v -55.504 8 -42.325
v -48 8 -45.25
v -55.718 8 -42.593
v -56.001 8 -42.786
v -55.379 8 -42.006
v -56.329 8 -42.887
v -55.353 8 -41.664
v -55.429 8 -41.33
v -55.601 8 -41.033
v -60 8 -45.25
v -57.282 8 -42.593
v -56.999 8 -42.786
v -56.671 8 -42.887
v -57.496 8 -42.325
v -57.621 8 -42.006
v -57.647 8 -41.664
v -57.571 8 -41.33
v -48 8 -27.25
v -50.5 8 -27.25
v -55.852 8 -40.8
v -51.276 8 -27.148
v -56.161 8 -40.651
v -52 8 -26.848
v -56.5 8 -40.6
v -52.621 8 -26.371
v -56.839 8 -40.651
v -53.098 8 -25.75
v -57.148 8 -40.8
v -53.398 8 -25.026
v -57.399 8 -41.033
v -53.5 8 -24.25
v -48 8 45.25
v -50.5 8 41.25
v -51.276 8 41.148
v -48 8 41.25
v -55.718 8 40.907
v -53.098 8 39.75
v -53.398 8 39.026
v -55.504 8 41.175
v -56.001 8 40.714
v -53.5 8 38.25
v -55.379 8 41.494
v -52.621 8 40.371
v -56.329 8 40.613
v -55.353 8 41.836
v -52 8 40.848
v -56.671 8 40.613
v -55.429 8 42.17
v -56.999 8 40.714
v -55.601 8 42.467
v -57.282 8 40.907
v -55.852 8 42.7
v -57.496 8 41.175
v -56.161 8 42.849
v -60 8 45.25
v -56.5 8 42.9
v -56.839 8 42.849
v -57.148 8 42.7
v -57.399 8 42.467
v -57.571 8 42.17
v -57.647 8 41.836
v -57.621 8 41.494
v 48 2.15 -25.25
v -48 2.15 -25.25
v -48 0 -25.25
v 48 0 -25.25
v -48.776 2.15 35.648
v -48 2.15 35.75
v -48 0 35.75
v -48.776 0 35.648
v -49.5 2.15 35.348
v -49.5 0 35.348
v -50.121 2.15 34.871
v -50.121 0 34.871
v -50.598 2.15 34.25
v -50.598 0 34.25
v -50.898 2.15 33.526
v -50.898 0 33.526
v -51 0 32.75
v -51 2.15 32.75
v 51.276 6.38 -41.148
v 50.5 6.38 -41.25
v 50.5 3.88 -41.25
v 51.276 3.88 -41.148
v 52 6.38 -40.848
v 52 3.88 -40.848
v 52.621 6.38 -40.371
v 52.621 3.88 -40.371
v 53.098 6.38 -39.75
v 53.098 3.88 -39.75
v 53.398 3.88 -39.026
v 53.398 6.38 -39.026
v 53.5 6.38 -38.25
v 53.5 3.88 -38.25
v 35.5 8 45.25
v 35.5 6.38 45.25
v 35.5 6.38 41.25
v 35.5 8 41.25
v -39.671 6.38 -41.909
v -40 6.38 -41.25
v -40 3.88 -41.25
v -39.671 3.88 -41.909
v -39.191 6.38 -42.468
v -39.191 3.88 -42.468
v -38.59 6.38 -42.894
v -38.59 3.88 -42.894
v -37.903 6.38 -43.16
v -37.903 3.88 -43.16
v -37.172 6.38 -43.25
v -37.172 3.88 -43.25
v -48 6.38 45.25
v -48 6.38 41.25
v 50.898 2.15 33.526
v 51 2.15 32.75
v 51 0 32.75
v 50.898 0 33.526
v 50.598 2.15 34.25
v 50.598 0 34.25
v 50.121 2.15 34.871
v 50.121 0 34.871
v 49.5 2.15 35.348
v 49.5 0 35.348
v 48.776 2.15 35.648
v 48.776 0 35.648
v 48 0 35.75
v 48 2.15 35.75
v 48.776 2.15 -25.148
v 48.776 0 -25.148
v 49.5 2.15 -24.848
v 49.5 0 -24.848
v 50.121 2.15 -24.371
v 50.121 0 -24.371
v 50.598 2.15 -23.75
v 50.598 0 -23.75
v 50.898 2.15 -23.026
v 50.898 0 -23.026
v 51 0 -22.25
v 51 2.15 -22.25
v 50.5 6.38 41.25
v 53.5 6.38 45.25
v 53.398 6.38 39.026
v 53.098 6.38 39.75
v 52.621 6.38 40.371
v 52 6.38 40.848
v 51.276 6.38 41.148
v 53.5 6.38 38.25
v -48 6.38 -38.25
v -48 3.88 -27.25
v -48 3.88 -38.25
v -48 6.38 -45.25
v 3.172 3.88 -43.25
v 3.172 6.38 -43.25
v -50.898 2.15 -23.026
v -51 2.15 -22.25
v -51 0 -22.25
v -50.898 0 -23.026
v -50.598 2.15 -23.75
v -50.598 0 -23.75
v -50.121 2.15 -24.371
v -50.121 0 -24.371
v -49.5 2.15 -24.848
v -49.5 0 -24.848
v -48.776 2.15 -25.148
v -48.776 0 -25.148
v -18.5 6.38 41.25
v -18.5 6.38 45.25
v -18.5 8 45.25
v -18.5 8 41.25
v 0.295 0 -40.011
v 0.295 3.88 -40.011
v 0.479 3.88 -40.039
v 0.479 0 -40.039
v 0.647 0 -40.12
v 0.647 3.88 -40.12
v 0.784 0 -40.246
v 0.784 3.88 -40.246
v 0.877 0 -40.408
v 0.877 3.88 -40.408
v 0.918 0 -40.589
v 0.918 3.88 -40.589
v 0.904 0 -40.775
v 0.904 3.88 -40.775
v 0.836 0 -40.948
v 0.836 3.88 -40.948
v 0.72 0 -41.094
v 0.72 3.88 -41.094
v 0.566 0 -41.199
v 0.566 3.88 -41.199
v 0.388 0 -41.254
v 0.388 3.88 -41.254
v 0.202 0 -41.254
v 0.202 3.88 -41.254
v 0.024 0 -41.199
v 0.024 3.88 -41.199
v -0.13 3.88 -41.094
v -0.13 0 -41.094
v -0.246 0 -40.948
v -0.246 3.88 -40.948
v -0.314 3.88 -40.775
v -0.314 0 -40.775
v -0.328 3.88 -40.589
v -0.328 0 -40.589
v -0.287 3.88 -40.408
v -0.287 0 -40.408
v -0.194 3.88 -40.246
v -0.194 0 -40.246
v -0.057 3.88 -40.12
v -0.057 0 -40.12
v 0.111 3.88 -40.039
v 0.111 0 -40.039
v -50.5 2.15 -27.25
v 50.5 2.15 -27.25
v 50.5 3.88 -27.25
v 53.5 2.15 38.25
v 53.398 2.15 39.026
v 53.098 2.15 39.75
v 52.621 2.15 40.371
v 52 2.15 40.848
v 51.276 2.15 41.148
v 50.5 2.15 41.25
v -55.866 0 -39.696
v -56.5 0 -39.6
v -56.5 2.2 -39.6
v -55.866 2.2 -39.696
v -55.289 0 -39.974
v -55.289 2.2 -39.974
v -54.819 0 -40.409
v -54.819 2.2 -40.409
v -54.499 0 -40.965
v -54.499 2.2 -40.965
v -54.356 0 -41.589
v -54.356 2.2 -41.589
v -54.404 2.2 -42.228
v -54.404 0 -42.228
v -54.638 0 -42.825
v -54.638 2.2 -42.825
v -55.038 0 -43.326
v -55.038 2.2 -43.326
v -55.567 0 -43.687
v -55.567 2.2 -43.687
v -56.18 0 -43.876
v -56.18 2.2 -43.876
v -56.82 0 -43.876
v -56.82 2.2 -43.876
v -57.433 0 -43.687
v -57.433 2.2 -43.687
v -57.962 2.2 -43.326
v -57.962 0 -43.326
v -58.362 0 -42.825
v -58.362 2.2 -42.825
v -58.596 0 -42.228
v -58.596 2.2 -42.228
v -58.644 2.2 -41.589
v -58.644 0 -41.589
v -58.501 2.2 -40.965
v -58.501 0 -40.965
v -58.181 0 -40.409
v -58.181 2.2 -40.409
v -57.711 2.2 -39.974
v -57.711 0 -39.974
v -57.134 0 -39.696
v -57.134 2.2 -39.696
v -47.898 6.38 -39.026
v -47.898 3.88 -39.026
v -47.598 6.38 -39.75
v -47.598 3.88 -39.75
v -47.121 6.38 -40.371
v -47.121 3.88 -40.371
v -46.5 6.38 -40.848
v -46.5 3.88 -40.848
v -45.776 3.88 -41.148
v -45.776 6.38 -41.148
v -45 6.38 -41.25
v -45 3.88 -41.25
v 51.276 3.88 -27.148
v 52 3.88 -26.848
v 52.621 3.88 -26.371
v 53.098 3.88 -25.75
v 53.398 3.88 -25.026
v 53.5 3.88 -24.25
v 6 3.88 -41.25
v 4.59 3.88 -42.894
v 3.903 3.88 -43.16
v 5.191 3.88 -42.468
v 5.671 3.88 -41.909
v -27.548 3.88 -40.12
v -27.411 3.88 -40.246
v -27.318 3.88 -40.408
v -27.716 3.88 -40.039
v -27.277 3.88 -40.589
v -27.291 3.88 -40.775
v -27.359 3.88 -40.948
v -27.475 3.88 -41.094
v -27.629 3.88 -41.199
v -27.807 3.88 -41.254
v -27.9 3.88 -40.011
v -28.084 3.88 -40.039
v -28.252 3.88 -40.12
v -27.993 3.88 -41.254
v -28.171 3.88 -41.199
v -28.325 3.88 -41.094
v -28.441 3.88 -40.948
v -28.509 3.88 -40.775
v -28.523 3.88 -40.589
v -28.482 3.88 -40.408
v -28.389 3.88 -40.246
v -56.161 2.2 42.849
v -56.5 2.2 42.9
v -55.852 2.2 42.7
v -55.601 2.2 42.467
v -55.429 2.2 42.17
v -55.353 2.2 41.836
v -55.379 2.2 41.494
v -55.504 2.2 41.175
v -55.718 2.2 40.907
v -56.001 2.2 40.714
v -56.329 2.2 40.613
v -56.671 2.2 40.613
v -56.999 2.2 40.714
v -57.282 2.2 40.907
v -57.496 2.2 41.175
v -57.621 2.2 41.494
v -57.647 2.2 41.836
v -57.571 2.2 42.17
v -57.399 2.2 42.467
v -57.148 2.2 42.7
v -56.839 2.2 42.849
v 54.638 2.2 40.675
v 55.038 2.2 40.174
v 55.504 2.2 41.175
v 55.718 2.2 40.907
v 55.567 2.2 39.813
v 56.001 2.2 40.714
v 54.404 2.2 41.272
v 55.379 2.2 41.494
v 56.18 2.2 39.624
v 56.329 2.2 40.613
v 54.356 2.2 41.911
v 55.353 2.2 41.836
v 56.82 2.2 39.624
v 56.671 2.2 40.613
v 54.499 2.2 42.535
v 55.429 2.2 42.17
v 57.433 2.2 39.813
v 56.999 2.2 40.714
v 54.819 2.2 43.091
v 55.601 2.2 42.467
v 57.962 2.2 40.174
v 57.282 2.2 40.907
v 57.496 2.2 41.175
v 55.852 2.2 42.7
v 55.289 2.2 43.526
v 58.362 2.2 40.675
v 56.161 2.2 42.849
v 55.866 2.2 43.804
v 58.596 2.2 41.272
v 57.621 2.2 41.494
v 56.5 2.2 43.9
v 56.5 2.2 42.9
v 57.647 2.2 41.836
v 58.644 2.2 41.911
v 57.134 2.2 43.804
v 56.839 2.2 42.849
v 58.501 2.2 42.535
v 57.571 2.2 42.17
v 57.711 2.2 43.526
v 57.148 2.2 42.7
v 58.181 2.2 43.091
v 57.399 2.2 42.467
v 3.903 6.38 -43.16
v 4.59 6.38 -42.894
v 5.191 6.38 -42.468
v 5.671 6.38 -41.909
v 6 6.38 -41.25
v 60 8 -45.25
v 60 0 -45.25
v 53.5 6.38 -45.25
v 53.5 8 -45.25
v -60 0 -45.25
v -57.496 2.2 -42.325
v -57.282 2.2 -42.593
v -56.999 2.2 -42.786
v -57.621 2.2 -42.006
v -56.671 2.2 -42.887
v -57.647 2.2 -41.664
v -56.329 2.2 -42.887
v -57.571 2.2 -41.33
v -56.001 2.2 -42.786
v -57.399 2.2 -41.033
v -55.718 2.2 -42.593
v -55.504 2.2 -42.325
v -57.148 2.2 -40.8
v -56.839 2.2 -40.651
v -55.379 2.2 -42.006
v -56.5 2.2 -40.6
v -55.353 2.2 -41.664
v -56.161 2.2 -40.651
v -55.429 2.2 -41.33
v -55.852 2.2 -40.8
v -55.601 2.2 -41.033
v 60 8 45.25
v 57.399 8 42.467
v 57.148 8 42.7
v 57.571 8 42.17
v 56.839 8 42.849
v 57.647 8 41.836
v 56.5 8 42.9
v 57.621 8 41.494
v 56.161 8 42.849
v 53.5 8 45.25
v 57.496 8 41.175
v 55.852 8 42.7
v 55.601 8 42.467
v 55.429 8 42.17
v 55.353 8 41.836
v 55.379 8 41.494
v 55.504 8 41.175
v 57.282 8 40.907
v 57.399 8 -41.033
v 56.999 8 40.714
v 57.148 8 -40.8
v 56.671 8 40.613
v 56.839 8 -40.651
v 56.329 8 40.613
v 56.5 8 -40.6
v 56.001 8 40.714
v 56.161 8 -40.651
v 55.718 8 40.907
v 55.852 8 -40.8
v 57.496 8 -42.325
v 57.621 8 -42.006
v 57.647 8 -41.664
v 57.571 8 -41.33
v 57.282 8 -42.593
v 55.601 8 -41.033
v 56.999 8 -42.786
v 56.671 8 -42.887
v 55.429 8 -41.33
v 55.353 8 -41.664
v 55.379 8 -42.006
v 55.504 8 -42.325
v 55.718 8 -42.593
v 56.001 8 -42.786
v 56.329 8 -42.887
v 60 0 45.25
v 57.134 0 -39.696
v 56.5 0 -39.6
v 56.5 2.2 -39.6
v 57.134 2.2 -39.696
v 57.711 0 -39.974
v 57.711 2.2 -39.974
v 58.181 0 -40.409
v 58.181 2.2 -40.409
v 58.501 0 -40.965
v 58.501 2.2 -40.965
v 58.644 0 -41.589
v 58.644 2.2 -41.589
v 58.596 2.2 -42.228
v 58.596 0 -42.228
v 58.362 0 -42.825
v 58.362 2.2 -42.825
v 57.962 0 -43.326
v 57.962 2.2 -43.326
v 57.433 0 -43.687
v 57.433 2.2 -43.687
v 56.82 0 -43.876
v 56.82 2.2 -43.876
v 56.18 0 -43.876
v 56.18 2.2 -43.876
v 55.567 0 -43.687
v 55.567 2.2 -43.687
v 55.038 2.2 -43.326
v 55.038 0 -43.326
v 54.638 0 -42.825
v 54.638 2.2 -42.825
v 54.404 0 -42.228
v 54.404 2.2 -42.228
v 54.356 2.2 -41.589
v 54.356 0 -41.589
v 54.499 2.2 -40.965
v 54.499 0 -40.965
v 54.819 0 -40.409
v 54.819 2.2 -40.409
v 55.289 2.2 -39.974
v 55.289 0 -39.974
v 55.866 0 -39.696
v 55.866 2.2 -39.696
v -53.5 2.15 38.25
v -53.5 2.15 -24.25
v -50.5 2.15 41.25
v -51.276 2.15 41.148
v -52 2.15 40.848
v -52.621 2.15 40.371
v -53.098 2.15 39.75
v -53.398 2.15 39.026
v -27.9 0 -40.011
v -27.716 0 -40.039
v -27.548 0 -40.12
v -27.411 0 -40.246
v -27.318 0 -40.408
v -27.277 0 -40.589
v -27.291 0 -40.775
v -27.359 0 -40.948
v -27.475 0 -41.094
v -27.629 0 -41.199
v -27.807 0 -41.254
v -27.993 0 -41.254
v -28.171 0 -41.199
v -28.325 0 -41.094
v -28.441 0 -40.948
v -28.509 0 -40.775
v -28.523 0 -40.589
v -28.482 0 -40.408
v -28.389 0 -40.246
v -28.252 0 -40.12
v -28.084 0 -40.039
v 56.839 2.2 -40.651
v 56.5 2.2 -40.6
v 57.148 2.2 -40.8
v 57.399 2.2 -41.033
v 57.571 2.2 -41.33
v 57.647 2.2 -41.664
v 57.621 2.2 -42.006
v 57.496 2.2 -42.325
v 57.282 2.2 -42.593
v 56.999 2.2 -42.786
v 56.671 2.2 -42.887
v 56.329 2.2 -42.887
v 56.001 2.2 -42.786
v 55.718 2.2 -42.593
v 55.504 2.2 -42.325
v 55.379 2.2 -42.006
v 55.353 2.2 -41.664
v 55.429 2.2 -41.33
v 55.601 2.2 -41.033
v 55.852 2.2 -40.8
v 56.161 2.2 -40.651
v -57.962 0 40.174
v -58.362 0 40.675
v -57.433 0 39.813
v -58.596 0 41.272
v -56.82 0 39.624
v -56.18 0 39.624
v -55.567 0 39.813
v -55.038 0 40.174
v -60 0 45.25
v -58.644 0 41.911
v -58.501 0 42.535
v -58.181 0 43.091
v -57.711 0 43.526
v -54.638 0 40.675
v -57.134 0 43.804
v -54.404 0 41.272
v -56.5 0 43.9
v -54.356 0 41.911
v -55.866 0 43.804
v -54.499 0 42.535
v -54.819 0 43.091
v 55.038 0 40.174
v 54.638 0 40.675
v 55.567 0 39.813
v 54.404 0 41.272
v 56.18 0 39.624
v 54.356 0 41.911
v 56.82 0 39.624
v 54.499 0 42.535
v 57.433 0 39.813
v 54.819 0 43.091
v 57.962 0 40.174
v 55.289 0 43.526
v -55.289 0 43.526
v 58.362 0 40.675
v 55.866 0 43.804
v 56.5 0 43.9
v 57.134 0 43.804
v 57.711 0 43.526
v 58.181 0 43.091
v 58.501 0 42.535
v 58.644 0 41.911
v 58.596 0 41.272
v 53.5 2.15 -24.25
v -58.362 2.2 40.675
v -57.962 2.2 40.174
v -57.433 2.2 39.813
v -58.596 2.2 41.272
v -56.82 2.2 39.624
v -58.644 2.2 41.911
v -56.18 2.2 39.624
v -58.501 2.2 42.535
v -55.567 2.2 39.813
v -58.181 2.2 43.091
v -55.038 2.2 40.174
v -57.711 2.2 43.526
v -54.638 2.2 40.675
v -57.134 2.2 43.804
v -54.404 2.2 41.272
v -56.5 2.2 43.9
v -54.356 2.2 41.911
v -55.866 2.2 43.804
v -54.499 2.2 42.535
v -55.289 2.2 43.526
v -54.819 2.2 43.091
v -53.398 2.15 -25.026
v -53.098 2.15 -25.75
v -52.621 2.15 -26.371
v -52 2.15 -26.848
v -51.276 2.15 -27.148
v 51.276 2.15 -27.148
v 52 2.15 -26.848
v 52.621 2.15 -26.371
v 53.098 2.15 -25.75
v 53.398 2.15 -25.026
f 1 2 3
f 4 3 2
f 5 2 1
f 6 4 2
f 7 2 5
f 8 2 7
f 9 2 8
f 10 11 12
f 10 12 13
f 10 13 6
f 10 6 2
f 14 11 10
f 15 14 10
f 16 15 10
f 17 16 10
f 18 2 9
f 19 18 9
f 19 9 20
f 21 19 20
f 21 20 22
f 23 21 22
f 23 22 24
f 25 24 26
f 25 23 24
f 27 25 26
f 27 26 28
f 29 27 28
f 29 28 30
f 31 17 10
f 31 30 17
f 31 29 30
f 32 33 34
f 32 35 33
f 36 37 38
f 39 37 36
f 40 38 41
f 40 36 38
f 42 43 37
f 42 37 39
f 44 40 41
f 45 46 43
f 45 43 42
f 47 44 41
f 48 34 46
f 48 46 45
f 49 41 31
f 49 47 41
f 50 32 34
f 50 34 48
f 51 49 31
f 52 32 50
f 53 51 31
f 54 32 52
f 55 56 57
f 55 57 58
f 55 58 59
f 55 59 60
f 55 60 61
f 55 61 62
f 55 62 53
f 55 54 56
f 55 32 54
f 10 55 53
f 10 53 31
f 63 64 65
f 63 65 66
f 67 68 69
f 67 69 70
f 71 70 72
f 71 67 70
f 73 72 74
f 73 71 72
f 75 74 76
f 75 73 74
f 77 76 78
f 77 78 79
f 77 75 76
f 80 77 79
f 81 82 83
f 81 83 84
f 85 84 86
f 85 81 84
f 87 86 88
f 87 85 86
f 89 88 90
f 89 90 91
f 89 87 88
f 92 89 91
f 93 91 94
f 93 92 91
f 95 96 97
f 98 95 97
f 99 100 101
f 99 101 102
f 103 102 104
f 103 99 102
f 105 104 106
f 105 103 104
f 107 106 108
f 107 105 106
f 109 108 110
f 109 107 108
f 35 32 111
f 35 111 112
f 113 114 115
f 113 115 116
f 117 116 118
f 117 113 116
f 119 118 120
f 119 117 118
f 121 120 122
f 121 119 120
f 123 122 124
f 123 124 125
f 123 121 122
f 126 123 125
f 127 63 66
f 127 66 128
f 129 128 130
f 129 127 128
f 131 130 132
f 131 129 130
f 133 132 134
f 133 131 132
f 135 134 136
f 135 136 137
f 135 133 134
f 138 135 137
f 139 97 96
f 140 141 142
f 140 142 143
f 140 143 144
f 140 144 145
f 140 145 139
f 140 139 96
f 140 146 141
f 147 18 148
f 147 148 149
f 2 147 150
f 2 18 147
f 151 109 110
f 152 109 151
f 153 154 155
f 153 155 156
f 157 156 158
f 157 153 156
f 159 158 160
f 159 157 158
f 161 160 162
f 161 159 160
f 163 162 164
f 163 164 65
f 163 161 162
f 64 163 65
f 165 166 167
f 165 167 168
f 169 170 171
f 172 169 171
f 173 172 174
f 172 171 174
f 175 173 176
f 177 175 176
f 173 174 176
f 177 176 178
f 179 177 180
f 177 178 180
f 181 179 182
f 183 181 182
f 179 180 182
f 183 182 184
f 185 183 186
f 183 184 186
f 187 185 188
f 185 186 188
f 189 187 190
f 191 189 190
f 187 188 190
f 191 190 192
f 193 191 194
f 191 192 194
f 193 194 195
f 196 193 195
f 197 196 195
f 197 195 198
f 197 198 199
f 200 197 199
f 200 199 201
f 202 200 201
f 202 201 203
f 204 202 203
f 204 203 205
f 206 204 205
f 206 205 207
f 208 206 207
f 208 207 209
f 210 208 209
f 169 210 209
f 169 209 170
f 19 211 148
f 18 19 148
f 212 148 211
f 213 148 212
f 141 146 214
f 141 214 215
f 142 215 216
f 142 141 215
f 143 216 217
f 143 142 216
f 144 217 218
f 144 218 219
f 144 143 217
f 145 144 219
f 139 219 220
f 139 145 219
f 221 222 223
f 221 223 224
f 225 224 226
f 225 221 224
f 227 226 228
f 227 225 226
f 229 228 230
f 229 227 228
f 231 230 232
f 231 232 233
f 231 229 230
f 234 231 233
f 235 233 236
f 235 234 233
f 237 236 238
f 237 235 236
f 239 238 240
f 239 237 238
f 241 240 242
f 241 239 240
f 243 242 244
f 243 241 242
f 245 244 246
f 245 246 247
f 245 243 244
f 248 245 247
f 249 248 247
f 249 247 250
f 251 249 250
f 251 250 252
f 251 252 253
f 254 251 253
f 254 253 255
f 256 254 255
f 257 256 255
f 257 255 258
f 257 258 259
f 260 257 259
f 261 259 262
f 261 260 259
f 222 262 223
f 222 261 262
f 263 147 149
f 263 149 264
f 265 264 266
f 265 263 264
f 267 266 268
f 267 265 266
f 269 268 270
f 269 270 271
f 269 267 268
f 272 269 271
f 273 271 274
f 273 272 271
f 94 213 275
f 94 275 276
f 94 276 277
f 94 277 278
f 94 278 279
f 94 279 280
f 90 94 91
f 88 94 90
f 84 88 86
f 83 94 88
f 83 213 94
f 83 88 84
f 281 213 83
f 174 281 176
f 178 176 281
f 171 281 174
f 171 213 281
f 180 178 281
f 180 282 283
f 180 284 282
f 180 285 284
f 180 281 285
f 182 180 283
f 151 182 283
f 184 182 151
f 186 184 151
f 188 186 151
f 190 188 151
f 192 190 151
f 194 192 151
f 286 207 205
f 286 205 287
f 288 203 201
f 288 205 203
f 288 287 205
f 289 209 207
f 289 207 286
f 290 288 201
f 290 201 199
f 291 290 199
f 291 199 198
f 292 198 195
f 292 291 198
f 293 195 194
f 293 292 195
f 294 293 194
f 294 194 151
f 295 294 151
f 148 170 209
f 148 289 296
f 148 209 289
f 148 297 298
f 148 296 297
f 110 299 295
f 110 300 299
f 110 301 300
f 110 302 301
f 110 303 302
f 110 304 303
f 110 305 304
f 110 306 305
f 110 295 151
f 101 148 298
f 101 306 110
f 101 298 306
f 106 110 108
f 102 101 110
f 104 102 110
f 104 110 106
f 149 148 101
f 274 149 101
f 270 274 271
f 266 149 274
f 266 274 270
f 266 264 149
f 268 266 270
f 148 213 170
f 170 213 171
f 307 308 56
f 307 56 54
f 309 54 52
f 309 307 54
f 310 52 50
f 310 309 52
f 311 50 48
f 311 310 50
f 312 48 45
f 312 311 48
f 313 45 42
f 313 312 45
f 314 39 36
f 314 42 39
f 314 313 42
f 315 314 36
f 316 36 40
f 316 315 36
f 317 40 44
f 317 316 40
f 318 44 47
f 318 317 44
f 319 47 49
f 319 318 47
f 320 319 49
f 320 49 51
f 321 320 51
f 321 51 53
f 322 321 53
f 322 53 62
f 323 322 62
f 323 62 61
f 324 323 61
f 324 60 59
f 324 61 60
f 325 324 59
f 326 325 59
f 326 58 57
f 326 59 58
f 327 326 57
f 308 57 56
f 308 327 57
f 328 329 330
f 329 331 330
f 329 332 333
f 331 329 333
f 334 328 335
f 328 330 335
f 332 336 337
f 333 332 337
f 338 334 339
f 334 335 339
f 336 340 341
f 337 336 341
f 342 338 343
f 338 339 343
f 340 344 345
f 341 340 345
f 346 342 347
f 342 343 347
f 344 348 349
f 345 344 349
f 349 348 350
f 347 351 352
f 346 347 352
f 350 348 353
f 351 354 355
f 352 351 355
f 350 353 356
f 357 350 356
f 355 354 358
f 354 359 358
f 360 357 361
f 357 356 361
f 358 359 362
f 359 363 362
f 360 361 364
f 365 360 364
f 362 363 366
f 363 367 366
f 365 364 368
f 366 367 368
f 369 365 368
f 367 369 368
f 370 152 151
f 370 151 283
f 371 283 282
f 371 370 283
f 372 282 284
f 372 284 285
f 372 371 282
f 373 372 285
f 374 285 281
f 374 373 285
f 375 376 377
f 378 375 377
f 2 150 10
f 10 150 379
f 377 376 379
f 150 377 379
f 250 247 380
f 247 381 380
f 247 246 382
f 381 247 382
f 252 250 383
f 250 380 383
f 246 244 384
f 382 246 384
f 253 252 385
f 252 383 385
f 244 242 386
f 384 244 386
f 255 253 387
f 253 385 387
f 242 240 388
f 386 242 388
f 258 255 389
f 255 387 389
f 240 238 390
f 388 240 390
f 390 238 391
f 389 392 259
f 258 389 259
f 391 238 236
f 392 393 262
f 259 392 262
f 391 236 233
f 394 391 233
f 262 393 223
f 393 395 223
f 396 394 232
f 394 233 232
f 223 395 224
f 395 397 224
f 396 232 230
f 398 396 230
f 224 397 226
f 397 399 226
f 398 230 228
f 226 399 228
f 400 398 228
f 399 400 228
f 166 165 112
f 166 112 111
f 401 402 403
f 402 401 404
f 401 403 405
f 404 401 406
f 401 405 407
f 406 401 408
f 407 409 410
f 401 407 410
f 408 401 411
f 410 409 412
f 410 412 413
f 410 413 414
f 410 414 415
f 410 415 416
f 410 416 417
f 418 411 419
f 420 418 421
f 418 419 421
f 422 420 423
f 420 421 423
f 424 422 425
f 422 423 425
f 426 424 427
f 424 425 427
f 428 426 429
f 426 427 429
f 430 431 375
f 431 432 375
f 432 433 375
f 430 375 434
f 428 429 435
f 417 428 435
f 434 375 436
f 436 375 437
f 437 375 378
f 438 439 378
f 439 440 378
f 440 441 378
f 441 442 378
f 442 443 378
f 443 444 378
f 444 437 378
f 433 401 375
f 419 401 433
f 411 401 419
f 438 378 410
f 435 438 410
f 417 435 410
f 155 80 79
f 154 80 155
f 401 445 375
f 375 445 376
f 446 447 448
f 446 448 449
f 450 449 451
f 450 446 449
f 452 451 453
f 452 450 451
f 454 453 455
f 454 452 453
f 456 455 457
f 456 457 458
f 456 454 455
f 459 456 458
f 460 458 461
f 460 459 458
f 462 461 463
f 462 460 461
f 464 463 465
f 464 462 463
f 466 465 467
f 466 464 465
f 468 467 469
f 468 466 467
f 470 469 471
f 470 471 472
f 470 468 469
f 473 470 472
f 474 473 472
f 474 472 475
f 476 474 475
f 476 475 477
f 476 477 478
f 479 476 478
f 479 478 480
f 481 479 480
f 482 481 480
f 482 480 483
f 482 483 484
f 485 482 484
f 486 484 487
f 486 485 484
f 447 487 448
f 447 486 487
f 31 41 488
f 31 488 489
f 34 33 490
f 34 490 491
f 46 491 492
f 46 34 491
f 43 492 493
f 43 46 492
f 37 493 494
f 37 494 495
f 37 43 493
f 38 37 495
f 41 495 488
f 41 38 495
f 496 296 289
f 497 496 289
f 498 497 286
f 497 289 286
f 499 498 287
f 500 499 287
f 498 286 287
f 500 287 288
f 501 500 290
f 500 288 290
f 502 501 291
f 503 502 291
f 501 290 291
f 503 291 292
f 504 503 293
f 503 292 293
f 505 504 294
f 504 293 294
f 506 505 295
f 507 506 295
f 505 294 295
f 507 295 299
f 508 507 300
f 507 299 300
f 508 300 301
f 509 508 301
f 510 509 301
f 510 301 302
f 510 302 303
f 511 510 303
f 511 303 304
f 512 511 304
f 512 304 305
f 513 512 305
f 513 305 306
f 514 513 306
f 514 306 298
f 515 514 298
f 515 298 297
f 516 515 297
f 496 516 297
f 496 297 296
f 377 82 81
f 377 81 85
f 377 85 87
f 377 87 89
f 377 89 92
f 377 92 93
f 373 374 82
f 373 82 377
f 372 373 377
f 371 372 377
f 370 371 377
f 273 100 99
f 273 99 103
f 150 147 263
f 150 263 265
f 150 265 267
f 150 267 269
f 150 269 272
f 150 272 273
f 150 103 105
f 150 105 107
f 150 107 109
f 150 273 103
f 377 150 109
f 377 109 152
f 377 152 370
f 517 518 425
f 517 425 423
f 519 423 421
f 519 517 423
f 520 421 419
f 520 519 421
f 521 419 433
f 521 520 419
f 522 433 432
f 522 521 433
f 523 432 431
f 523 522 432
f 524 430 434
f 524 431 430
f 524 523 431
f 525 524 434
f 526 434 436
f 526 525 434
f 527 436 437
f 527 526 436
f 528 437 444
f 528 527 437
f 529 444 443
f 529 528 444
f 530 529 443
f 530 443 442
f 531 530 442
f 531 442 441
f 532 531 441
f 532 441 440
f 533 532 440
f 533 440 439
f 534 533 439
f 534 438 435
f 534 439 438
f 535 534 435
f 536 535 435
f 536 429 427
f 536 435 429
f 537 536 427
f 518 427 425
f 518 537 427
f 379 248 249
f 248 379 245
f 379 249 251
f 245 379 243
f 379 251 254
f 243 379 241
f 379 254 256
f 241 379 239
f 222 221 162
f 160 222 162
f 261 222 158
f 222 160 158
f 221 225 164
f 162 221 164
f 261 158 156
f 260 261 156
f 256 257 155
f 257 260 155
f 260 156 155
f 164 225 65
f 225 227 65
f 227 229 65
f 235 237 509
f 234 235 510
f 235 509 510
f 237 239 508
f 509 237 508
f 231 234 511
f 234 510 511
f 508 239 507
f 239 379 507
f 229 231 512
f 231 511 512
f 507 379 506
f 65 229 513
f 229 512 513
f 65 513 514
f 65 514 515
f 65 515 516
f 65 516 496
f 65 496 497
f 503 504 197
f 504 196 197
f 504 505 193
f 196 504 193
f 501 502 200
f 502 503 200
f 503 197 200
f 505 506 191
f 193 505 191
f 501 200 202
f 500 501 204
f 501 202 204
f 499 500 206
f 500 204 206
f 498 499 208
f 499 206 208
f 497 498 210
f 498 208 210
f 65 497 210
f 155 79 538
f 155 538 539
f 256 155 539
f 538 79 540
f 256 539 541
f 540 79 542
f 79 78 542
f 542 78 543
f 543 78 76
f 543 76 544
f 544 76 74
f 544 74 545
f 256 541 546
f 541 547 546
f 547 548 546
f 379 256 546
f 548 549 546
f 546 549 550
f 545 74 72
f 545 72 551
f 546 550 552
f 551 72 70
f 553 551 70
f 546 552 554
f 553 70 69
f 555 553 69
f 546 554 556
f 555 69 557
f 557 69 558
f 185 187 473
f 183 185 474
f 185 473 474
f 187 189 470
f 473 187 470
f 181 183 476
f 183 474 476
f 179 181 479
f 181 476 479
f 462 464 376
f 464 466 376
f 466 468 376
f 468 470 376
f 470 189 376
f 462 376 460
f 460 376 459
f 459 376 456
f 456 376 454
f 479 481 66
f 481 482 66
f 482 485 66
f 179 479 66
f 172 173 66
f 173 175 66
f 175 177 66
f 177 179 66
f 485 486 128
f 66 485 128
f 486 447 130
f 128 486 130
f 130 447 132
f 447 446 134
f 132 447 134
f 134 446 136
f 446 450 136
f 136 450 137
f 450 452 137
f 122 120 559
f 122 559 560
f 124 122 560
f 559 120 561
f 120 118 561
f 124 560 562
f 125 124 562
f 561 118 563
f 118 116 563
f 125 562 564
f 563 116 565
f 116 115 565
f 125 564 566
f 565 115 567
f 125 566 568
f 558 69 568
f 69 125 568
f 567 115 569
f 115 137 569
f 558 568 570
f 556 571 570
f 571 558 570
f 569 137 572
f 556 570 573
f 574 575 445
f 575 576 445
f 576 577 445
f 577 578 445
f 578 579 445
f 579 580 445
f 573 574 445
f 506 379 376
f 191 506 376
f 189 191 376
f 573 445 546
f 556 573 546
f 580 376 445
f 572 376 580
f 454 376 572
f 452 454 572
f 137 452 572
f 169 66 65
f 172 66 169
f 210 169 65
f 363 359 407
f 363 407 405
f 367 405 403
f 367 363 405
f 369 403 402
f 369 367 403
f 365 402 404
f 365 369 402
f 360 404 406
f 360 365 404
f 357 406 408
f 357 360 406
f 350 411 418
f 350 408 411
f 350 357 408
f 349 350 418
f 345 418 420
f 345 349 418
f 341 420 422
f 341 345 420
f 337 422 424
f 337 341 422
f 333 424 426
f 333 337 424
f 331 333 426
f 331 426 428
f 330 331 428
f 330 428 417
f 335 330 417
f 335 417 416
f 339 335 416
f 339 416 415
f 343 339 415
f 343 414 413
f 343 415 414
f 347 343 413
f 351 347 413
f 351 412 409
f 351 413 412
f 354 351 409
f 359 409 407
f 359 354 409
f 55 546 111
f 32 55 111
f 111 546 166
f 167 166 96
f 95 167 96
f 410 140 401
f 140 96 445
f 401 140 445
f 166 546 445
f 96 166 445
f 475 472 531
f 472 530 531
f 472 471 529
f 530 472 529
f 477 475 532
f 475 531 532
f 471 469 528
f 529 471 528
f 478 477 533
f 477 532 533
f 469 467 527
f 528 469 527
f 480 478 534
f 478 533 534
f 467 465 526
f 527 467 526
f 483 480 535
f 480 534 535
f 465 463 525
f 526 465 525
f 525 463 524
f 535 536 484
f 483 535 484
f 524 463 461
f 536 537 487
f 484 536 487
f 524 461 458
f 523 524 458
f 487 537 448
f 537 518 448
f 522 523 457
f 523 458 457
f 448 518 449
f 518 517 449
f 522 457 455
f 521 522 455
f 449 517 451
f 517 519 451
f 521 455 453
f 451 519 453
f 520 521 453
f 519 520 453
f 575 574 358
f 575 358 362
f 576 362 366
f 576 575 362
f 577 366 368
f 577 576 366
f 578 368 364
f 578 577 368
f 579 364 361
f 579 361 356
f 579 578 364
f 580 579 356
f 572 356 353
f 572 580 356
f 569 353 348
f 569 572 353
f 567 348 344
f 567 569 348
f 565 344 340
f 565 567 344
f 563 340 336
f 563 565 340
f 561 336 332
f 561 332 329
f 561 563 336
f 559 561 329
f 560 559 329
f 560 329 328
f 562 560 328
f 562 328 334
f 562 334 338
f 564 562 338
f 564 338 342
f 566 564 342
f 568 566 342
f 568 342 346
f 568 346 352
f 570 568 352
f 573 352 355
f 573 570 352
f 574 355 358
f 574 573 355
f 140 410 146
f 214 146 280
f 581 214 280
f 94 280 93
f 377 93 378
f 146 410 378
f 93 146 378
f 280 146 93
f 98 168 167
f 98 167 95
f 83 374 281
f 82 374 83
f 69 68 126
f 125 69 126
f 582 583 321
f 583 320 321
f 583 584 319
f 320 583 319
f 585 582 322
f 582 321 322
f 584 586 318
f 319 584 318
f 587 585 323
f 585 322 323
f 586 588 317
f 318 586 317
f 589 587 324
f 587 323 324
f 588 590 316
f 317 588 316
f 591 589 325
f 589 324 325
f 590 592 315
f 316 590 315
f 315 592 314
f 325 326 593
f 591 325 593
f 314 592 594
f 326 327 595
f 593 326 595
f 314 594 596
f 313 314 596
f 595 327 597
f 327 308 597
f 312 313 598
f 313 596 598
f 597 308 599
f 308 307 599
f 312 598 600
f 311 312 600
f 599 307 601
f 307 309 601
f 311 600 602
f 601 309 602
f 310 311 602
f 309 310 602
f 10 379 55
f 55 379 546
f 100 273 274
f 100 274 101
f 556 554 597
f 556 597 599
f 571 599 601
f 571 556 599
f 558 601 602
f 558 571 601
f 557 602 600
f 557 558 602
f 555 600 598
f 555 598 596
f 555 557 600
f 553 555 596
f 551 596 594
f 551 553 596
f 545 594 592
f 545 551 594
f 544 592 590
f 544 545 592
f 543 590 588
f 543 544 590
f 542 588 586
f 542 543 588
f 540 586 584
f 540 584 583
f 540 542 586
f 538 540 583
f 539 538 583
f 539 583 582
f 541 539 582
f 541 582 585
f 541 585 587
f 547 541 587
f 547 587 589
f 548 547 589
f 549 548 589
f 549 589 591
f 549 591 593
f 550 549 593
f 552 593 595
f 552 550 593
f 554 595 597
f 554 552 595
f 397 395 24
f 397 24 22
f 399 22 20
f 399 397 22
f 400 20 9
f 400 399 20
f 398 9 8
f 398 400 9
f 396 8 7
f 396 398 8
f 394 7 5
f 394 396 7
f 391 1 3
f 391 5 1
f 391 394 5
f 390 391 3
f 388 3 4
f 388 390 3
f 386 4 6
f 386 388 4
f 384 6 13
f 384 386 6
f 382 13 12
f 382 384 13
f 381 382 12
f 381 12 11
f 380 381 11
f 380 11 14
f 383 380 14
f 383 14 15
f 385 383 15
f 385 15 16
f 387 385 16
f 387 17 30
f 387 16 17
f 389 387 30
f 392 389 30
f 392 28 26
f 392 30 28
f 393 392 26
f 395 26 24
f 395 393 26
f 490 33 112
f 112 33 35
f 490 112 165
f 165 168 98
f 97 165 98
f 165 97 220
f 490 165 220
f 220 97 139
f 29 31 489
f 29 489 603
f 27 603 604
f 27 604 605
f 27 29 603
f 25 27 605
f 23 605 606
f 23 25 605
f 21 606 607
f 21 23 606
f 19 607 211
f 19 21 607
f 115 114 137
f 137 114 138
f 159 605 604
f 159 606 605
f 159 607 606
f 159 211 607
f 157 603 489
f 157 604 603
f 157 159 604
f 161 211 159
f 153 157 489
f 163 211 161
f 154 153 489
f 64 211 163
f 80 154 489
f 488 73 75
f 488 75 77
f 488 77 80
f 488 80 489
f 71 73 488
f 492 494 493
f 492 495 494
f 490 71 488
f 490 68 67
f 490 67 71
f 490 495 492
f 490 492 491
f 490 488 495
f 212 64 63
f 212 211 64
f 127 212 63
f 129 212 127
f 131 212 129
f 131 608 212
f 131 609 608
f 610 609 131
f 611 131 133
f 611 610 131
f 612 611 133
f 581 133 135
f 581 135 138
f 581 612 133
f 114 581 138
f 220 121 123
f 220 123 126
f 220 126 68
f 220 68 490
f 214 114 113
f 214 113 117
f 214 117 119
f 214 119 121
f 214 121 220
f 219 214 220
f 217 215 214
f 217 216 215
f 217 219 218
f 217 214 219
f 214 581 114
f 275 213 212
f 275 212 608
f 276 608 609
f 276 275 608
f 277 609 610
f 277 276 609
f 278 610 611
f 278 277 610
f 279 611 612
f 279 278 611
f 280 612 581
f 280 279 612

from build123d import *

# Parameters (mm, degrees)
EXTRUDE_1_DEPTH        = 8
SKETCH_2_W             = 101.5
SKETCH_2_H             = 90.5
PCB_DEPTH              = 1.62
CUT_EXTRUDE_1931_REACH = 77.575
SKETCH_2_4_W           = 102
SKETCH_2_4_H           = 61
SKETCH_2_5_W           = 107
SKETCH_2_5_H           = 68.5
CUT_EXTRUDE_1995_DEPTH = 5.85
SKETCH_3_W             = 101.5
SKETCH_3_H             = 14
CUT_EXTRUDE_2361_DEPTH = 2.5
SKETCH_3_3_W           = 46
SKETCH_3_3_H           = 2
CUT_EXTRUDE_2_DEPTH    = 2.5
SKETCH_2585_R          = 2.15
CUT_EXTRUDE_2883_DEPTH = 2.2
SKETCH_3_2_R           = 1.15
CUT_EXTRUDE_2937_DEPTH = 76.574880086
FILLET_1_R             = 3
SKETCH_2_6_R           = 0.625
LED_DEPTH              = 76.574880086
PCB_START              = -1.62
SKETCH_2_7_W           = 54
SKETCH_2_7_H           = 4
PCB_2_DEPTH            = 1.62


with BuildPart() as part:
    # 草图1 → 凸台-拉伸1 (new body)
    with BuildSketch(Plane(origin=(0, 0, 0), x_dir=(1, 0, 0), z_dir=(0, 1, 0))):
        Polygon((57, 45.25), (60, 45.25), (60, 42.25), (60, -42.25), (60, -45.25), (57, -45.25), (-57, -45.25), (-60, -45.25), (-60, -42.25), (-60, 42.25), (-60, 45.25), (-57, 45.25), align=None)
    extrude(amount=EXTRUDE_1_DEPTH)

    # 草图2 → PCB (cut)
    with BuildSketch(Plane(origin=(0, 8, 0), x_dir=(1, 0, 0), z_dir=(0, 1, 0))):
        with Locations((2.75, 0)):
            Rectangle(SKETCH_2_W, SKETCH_2_H)
    extrude(amount=-PCB_DEPTH, mode=Mode.SUBTRACT)

    # 草图2<4> → Cut-Extrude 1931 (cut, up to next)
    with BuildSketch(Plane(origin=(0, 8, 0), x_dir=(1, 0, 0), z_dir=(0, 1, 0)), mode=Mode.PRIVATE) as cut_extrude_1931_sk1:
        with Locations((0, -5.25)):
            Rectangle(SKETCH_2_4_W, SKETCH_2_4_H)
    cut_extrude_1931_tool1 = extrude(cut_extrude_1931_sk1.sketch, amount=-CUT_EXTRUDE_1931_REACH, mode=Mode.PRIVATE) & part.part
    add(cut_extrude_1931_tool1.solids().sort_by_distance((0, 8, 5.25))[0], mode=Mode.SUBTRACT)

    # 草图2<5> → Cut-Extrude 1995 (cut)
    with BuildSketch(Plane(origin=(0, 8, 0), x_dir=(1, 0, 0), z_dir=(0, 1, 0))):
        with Locations((0, -7)):
            Rectangle(SKETCH_2_5_W, SKETCH_2_5_H)
    extrude(amount=-CUT_EXTRUDE_1995_DEPTH, mode=Mode.SUBTRACT)

    # Sketch 3 → Cut-Extrude 2361 (cut)
    with BuildSketch(Plane(origin=(0, 6.38, 0), x_dir=(1, 0, 0), z_dir=(0, 1, 0))):
        with Locations((2.75, 34.25)):
            Rectangle(SKETCH_3_W, SKETCH_3_H)
    extrude(amount=-CUT_EXTRUDE_2361_DEPTH, mode=Mode.SUBTRACT)

    # 草图3<3> → 穿孔焊盘切除2 (cut)
    with BuildSketch(Plane(origin=(0, 6.38, 0), x_dir=(1, 0, 0), z_dir=(0, 1, 0))):
        with Locations((-17, 42.25)):
            Rectangle(SKETCH_3_3_W, SKETCH_3_3_H)
    extrude(amount=-CUT_EXTRUDE_2_DEPTH, mode=Mode.SUBTRACT)

    # Sketch 2585 → Cut-Extrude 2883 (cut)
    with BuildSketch(Plane(origin=(0, 0, 0), x_dir=(1, 0, 0), z_dir=(0, 1, 0))):
        with Locations(Location((-56.5, -41.75, 0), (0, 0, 270))):
            Circle(SKETCH_2585_R)
        with Locations(Location((-56.5, 41.75, 0), (0, 0, 270))):
            Circle(SKETCH_2585_R)
        with Locations(Location((56.5, 41.75, 0), (0, 0, 270))):
            Circle(SKETCH_2585_R)
        with Locations(Location((56.5, -41.75, 0), (0, 0, 270))):
            Circle(SKETCH_2585_R)
    extrude(amount=CUT_EXTRUDE_2883_DEPTH, mode=Mode.SUBTRACT)

    # Sketch 3 2 → Cut-Extrude 2937 (cut, through all)
    with BuildSketch(Plane(origin=(0, 0, 0), x_dir=(1, 0, 0), z_dir=(0, 1, 0))):
        with Locations(Location((-56.5, -41.75, 0), (0, 0, 270))):
            Circle(SKETCH_3_2_R)
        with Locations(Location((-56.5, 41.75, 0), (0, 0, 270))):
            Circle(SKETCH_3_2_R)
        with Locations(Location((56.5, 41.75, 0), (0, 0, 270))):
            Circle(SKETCH_3_2_R)
        with Locations(Location((56.5, -41.75, 0), (0, 0, 270))):
            Circle(SKETCH_3_2_R)
    extrude(amount=CUT_EXTRUDE_2937_DEPTH, mode=Mode.SUBTRACT)

    # 圆角1
    # the kernel refuses this fillet: 3 mm, written as the material it adds along each edge
    with BuildSketch(Plane(origin=(-51, 2.15, -25.25), x_dir=(1, 0, 0), z_dir=(0, -1, 0)), Plane(origin=(-51, 2.15, 35.75), x_dir=(0, 0, -1), z_dir=(0, -1, 0))) as fillet_1_piece_1:
        with BuildLine():
            CenterArc((FILLET_1_R, FILLET_1_R), FILLET_1_R, 180, 90)
            Line((0, FILLET_1_R), (0, 0))
            Line((0, 0), (FILLET_1_R, 0))
        make_face()
    extrude(amount=2.15)
    with BuildSketch(Plane(origin=(-53.5, 8, -27.25), x_dir=(1, 0, 0), z_dir=(0, -1, 0))) as fillet_1_piece_2:
        with BuildLine():
            CenterArc((FILLET_1_R, FILLET_1_R), FILLET_1_R, 180, 90)
            Line((0, FILLET_1_R), (0, 0))
            Line((0, 0), (FILLET_1_R, 0))
        make_face()
    extrude(amount=5.85)
    with BuildSketch(Plane(origin=(-53.5, 8, 41.25), x_dir=(1, 0, 0), z_dir=(0, -1, 0))) as fillet_1_piece_3:
        with BuildLine():
            CenterArc((FILLET_1_R, -FILLET_1_R), FILLET_1_R, 90, 90)
            Line((0, -FILLET_1_R), (0, 0))
            Line((0, 0), (FILLET_1_R, 0))
        make_face()
    extrude(amount=5.85)
    with BuildSketch(Plane(origin=(51, 2.15, 35.75), x_dir=(0, 0, -1), z_dir=(0, -1, 0)), Plane(origin=(51, 2.15, -25.25), x_dir=(-1, 0, 0), z_dir=(0, -1, 0))) as fillet_1_piece_4:
        with BuildLine():
            CenterArc((FILLET_1_R, -FILLET_1_R), FILLET_1_R, 90, 90)
            Line((0, -FILLET_1_R), (0, 0))
            Line((0, 0), (FILLET_1_R, 0))
        make_face()
    extrude(amount=2.15)
    with BuildSketch(Plane(origin=(53.5, 6.38, 41.25), x_dir=(0, 0, -1), z_dir=(0, -1, 0))) as fillet_1_piece_5:
        with BuildLine():
            CenterArc((FILLET_1_R, -FILLET_1_R), FILLET_1_R, 90, 90)
            Line((0, -FILLET_1_R), (0, 0))
            Line((0, 0), (FILLET_1_R, 0))
        make_face()
    extrude(amount=4.23)
    with BuildSketch(Plane(origin=(53.5, 3.88, -27.25), x_dir=(0, 0, 1), z_dir=(0, -1, 0))) as fillet_1_piece_6:
        with BuildLine():
            CenterArc((FILLET_1_R, FILLET_1_R), FILLET_1_R, 180, 90)
            Line((0, FILLET_1_R), (0, 0))
            Line((0, 0), (FILLET_1_R, 0))
        make_face()
    extrude(amount=1.73)
    with BuildSketch(Plane(origin=(6, 6.38, -43.25), x_dir=(-1, 0, 0), z_dir=(0, -1, 0))) as fillet_1_piece_7:
        with BuildLine():
            CenterArc((2.828427125, -3), FILLET_1_R, 90, 70.528779366)
            Line((0, -2), (0, 0))
            Line((0, 0), (2.828427125, 0))
        make_face()
    extrude(amount=2.5)
    with BuildSketch(Plane(origin=(-40, 6.38, -43.25), x_dir=(0, 0, 1), z_dir=(0, -1, 0))) as fillet_1_piece_8:
        with BuildLine():
            CenterArc((3, -2.828427125), FILLET_1_R, 109.471220634, 70.528779366)
            Line((0, -2.828427125), (0, 0))
            Line((0, 0), (2, 0))
        make_face()
    extrude(amount=2.5)
    with BuildSketch(Plane(origin=(-48, 6.38, -41.25), x_dir=(0, 0, 1), z_dir=(0, -1, 0))) as fillet_1_piece_9:
        with BuildLine():
            CenterArc((FILLET_1_R, -FILLET_1_R), FILLET_1_R, 90, 90)
            Line((0, -FILLET_1_R), (0, 0))
            Line((0, 0), (FILLET_1_R, 0))
        make_face()
    extrude(amount=2.5)
    with BuildSketch(Plane(origin=(53.5, 6.38, -41.25), x_dir=(0, 0, 1), z_dir=(0, -1, 0))) as fillet_1_piece_10:
        with BuildLine():
            CenterArc((FILLET_1_R, FILLET_1_R), FILLET_1_R, 180, 90)
            Line((0, FILLET_1_R), (0, 0))
            Line((0, 0), (FILLET_1_R, 0))
        make_face()
    extrude(amount=2.5)

    # 草图2<6> → LED孔 (cut, through all)
    with BuildSketch(Plane(origin=(0, 8, 0), x_dir=(1, 0, 0), z_dir=(0, 1, 0))):
        with Locations(Location((0.295, 40.636, 0), (0, 0, 270))):
            Circle(SKETCH_2_6_R)
        with Locations(Location((-27.9, 40.636, 0), (0, 0, 270))):
            Circle(SKETCH_2_6_R)
    extrude(amount=-LED_DEPTH, mode=Mode.SUBTRACT)

    # 草图2<7> → PCB 2 (add)
    with BuildSketch(Plane(origin=(0, 8, 0), x_dir=(1, 0, 0), z_dir=(0, 1, 0)).offset(PCB_START)):
        with Locations((8.5, -43.25)):
            Rectangle(SKETCH_2_7_W, SKETCH_2_7_H)
    extrude(amount=PCB_2_DEPTH)


solid = part.part
